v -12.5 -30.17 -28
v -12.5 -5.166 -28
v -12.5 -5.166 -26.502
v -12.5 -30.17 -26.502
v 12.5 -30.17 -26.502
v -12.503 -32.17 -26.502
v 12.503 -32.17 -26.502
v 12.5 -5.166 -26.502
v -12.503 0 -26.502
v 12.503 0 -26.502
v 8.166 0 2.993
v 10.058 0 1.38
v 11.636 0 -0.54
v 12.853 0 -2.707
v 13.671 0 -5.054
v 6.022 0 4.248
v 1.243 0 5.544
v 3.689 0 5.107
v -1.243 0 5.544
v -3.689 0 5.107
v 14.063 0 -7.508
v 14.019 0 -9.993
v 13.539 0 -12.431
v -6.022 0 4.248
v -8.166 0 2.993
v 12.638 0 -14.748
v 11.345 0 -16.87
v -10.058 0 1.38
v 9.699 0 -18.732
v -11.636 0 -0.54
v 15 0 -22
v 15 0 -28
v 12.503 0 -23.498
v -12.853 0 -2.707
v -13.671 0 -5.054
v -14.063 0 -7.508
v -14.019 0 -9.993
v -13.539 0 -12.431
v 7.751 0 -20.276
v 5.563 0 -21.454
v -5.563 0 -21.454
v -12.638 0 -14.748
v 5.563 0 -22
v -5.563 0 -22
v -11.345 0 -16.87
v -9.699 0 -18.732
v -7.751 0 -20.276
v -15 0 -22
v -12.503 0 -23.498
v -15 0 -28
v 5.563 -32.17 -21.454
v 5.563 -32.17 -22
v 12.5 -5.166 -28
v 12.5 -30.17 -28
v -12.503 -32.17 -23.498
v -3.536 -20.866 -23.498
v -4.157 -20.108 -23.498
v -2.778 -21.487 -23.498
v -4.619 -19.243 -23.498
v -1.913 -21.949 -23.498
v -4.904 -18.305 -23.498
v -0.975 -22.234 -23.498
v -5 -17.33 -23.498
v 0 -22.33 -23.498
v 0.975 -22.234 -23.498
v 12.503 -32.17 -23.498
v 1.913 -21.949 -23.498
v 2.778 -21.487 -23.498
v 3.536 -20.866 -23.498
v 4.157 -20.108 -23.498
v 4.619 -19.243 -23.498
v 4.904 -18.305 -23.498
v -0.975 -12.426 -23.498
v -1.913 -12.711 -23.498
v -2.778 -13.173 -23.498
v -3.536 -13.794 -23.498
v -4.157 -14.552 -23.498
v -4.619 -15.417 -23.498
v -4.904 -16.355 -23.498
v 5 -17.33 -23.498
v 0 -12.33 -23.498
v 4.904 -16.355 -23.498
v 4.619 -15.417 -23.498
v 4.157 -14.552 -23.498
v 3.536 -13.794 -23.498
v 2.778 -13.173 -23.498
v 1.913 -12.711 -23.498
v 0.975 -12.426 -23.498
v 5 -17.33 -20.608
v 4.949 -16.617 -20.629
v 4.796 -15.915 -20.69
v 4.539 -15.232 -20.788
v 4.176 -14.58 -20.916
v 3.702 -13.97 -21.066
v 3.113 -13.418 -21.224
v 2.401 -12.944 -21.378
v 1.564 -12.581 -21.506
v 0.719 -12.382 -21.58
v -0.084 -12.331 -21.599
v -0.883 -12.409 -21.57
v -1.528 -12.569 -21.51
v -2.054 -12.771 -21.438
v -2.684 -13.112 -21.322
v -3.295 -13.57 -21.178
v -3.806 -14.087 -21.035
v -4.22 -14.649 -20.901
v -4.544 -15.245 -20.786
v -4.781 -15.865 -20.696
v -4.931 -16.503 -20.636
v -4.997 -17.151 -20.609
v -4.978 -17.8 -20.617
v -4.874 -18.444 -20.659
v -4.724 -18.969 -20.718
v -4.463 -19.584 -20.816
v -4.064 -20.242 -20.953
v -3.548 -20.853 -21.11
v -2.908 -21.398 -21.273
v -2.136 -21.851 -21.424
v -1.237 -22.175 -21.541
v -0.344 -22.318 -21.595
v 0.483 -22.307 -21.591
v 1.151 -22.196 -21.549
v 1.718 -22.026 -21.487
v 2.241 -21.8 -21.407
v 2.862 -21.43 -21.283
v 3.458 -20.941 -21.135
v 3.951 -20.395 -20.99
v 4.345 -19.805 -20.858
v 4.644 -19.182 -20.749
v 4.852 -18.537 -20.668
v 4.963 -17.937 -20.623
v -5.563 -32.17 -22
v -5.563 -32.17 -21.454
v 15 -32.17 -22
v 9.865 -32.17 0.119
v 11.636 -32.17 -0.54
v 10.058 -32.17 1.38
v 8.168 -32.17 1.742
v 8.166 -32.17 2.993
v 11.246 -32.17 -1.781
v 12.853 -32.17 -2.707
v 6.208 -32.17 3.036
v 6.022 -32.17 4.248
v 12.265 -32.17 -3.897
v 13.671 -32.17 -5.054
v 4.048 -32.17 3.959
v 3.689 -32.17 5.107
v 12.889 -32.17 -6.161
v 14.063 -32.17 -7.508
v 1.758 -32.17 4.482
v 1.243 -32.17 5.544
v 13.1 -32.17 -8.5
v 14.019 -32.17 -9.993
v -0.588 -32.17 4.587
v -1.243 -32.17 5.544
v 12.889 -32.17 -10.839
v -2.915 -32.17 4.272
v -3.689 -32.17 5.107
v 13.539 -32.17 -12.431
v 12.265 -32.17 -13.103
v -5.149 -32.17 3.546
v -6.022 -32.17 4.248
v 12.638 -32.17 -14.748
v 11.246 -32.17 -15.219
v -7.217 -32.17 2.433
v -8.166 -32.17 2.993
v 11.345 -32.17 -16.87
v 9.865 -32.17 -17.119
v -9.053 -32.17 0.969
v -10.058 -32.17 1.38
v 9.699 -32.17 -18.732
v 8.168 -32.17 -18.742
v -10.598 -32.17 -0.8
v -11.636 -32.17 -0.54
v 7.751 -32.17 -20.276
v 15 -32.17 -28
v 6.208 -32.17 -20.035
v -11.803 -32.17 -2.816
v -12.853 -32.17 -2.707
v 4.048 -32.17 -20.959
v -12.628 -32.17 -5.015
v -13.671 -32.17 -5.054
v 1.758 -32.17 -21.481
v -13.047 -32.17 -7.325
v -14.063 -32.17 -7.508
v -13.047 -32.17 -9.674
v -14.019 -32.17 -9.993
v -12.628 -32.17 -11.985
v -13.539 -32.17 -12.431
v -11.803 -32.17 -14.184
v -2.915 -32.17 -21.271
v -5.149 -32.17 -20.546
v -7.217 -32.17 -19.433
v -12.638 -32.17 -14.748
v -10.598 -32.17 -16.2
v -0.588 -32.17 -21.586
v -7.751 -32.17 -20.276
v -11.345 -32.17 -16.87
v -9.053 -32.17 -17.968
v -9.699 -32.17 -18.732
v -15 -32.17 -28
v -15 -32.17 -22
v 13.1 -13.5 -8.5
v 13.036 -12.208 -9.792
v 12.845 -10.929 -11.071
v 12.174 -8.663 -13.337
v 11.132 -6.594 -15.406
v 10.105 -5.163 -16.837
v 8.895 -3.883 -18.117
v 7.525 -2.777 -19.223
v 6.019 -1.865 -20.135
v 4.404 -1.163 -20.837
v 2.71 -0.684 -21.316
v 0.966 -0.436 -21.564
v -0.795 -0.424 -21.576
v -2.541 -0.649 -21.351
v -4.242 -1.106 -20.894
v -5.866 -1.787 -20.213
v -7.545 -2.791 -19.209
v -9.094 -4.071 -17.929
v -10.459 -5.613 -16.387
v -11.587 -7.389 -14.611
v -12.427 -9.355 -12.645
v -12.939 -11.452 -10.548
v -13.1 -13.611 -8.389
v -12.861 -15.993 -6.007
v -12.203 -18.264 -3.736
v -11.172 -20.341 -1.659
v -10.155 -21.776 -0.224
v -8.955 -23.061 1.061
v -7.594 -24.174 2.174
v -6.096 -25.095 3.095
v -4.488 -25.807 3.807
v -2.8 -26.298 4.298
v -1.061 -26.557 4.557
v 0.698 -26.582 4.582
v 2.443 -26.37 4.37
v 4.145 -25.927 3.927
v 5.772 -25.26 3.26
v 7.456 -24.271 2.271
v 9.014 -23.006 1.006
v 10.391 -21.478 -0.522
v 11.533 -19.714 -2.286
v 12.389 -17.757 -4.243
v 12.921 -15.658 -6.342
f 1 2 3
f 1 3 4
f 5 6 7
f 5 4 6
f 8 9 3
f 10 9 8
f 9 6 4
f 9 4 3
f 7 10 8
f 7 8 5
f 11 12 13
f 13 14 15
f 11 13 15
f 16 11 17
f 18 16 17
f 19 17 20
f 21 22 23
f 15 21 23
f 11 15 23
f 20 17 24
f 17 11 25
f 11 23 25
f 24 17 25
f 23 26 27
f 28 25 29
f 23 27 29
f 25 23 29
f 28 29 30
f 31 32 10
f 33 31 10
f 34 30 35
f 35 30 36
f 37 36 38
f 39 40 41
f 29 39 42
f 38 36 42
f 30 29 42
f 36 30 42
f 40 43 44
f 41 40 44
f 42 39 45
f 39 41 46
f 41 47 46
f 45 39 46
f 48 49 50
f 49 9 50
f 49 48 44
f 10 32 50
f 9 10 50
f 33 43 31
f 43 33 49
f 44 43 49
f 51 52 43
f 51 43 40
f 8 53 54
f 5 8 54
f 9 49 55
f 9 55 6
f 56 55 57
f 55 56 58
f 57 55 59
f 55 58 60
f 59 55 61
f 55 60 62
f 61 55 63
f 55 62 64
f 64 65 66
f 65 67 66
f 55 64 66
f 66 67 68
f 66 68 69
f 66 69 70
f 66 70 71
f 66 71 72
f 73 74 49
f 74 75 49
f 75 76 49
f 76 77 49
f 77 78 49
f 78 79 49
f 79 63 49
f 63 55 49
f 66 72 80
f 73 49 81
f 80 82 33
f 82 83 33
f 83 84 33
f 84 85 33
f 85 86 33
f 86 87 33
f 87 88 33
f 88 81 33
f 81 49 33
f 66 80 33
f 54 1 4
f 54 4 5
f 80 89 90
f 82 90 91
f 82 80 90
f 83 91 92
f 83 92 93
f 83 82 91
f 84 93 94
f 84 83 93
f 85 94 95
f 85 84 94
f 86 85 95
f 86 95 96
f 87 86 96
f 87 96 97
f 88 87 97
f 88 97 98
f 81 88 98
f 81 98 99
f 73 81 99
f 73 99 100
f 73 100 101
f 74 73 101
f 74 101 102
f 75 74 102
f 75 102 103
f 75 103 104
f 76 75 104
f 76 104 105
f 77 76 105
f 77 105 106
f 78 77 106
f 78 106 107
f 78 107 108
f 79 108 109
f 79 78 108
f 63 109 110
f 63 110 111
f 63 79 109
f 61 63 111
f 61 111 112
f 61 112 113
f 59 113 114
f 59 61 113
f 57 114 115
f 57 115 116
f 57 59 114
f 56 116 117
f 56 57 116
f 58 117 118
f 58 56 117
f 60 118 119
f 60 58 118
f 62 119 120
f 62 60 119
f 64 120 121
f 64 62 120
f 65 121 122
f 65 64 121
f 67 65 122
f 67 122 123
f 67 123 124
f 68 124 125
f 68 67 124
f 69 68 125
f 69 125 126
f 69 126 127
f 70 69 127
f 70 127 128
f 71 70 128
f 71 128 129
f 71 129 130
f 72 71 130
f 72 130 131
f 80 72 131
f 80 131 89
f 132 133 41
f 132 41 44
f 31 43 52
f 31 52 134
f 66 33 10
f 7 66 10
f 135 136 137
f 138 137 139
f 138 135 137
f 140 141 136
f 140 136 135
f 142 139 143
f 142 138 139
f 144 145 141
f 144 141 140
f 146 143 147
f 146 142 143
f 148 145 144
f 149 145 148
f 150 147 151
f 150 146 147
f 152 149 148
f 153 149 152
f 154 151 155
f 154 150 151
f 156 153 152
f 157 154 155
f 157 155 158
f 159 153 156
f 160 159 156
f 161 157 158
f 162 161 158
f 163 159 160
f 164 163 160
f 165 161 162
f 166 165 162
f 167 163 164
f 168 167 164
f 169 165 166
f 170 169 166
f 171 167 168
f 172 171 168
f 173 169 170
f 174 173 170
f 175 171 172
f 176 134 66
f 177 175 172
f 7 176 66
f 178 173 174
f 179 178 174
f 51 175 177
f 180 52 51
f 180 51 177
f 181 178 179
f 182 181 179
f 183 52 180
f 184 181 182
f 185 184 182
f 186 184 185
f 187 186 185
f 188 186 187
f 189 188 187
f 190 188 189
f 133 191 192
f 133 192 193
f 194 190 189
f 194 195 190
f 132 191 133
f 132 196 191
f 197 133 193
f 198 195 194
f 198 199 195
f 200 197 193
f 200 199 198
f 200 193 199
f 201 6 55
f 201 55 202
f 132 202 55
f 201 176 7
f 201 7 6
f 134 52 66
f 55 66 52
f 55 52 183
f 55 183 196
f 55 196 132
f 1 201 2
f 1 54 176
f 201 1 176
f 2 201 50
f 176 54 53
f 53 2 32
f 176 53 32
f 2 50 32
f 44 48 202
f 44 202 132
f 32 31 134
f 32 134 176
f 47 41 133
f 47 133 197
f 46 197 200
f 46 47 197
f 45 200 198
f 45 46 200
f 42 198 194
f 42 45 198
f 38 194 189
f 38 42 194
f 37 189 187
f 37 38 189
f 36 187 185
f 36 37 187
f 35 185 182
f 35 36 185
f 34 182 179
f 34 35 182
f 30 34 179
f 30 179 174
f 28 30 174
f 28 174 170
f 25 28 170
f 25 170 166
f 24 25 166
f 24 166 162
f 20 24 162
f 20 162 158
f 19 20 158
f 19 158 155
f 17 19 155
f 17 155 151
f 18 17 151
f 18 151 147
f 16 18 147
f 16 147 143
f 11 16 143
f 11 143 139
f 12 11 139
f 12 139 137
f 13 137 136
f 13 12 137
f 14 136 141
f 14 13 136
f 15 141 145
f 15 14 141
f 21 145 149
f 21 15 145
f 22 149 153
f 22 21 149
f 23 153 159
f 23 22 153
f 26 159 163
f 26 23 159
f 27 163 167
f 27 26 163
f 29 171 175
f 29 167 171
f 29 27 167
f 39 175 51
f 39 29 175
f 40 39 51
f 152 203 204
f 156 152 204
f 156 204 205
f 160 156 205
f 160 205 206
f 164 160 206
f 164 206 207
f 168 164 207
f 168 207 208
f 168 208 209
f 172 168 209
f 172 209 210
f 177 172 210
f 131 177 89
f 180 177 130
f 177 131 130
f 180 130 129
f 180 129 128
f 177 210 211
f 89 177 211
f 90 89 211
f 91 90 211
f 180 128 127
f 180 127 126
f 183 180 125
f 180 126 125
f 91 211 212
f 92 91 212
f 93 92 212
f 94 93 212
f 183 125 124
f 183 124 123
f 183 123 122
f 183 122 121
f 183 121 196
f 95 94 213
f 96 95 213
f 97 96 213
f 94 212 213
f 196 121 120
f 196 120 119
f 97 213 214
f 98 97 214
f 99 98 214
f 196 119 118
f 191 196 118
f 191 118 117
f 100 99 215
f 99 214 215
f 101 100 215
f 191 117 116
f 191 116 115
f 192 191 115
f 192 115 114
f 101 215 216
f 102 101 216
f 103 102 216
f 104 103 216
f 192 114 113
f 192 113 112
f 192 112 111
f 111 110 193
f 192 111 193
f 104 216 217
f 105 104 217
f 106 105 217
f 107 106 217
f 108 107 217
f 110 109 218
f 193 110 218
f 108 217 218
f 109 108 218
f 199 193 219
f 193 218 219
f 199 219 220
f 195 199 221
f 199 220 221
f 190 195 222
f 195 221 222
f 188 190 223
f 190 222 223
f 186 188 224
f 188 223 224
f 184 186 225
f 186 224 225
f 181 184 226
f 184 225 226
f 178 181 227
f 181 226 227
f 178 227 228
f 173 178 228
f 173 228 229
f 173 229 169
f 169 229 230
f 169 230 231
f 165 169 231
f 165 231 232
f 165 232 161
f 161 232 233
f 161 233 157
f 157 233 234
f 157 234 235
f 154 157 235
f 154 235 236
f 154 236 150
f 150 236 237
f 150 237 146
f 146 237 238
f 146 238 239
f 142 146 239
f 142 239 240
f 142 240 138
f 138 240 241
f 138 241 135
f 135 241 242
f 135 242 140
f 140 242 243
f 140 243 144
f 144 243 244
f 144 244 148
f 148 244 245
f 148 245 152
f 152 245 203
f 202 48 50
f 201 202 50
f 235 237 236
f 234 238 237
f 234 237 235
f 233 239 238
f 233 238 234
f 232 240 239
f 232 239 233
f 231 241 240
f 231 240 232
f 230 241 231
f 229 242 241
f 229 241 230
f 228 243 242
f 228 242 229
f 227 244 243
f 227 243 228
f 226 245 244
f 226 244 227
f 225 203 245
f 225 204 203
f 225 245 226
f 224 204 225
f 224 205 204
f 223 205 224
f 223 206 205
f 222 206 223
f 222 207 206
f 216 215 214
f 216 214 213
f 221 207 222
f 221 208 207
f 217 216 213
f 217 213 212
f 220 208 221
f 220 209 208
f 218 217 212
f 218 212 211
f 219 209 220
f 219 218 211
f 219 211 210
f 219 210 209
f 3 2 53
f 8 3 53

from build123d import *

# Parameters (mm, degrees)
CROQUIS1_W                 = 30
CROQUIS1_H                 = 6
CROQUIS1_W_2               = 25.006000518
CROQUIS1_H_2               = 3.004001618
SALIENTE_EXTRUIR1_DEPTH    = 32.17
CROQUIS2_W                 = 25
CROQUIS2_H                 = 25.003841724
CORTAR_EXTRUIR1_DEPTH      = 1.497999
CROQUIS3_R                 = 14.098435913
CROQUIS3_R_2               = 13.1
SALIENTE_EXTRUIR2_DEPTH    = 32.17
CROQUIS10_W                = 30.177827817
CROQUIS10_H                = 41.273822818
SALIENTE_EXTRUIR4_DEPTH    = 22
CORTAR_EXTRUIR2_DEPTH      = 10
CORTAR_EXTRUIR2_DEPTH_BACK = 58
CROQUIS12_W                = 43.091208183
CROQUIS12_H                = 18.563452801
CORTAR_EXTRUIR3_DEPTH      = 58
CORTAR_EXTRUIR3_DEPTH_BACK = 58
SALIENTE_EXTRUIR6_DEPTH    = 32.17
CROQUIS22_R                = 5
CORTAR_EXTRUIR6_DEPTH      = 4


with BuildPart() as part:
    # Croquis1 → Saliente-Extruir1 (new body)
    with BuildSketch(Plane(origin=(0, 0, 0), x_dir=(1, 0, 0), z_dir=(0, 1, 0))):
        with Locations((0, 25)):
            Rectangle(CROQUIS1_W, CROQUIS1_H)
        with Locations((0, 25)):
            Rectangle(CROQUIS1_W_2, CROQUIS1_H_2, mode=Mode.SUBTRACT)
    extrude(amount=-SALIENTE_EXTRUIR1_DEPTH)

    # Croquis2 → Cortar-Extruir1 (cut)
    with BuildSketch(Plane(origin=(0, 0, -28), x_dir=(1, 0, 0), z_dir=(0, 0, -1))):
        with Locations((0, 17.668079138)):
            Rectangle(CROQUIS2_W, CROQUIS2_H)
    extrude(amount=-CORTAR_EXTRUIR1_DEPTH, mode=Mode.SUBTRACT)

    # Croquis3 → Saliente-Extruir2 (add)
    with BuildSketch(Plane(origin=(0, 0, 0), x_dir=(1, 0, 0), z_dir=(0, 1, 0))):
        with Locations((0, 8.499687815)):
            Circle(CROQUIS3_R)
        with Locations((0, 8.499687815)):
            Circle(CROQUIS3_R_2, mode=Mode.SUBTRACT)
    extrude(amount=-SALIENTE_EXTRUIR2_DEPTH)

    # Croquis10 → Saliente-Extruir4 (add)
    with BuildSketch(Plane(origin=(0, -11, -11), x_dir=(-1, 0, 0), z_dir=(0, -0.707106781, -0.707106781))):
        with Locations((-0.620676422, -5.363625683)):
            Rectangle(CROQUIS10_W, CROQUIS10_H)
    extrude(amount=-SALIENTE_EXTRUIR4_DEPTH)

    # Croquis11 → Cortar-Extruir2 (cut, two sides)
    with BuildSketch(Plane.XZ.offset(32.17)) as cortar_extruir2_sk:
        with BuildLine():
            Line((-4.676723545, -21.799843908), (-14.468237486, -21.799843908))
            Line((-14.468237486, -21.799843908), (-14.468237486, 22.941505279))
            Line((-14.468237486, 22.941505279), (15.709590331, 22.941505279))
            Line((15.709590331, 22.941505279), (15.709590331, -21.799843908))
            Line((15.709590331, -21.799843908), (4.676723545, -21.799843908))
            ThreePointArc((4.676723545, -21.799843908), (0, 5.598748098), (-4.676723545, -21.799843908))
        make_face()
    extrude(amount=CORTAR_EXTRUIR2_DEPTH, mode=Mode.SUBTRACT)
    extrude(cortar_extruir2_sk.sketch, amount=-CORTAR_EXTRUIR2_DEPTH_BACK, mode=Mode.SUBTRACT)

    # Croquis12 → Cortar-Extruir3 (cut, two sides)
    with BuildSketch(Plane(origin=(0, 0, 0), x_dir=(0, 0, -1), z_dir=(1, 0, 0))) as cortar_extruir3_sk:
        with Locations((6.454395908, 9.281726401)):
            Rectangle(CROQUIS12_W, CROQUIS12_H)
    extrude(amount=CORTAR_EXTRUIR3_DEPTH, mode=Mode.SUBTRACT)
    extrude(cortar_extruir3_sk.sketch, amount=-CORTAR_EXTRUIR3_DEPTH_BACK, mode=Mode.SUBTRACT)

    # Croquis23 → Saliente-Extruir6 (add, through all)
    with BuildSketch(Plane(origin=(0, 0, 0), x_dir=(1, 0, 0), z_dir=(0, 1, 0))):
        with BuildLine():
            Line((-5.562938112, 22), (-4.062938112, 22))
            ThreePointArc((-4.062938112, 22), (-4.820668551, 21.748350009), (-5.562938112, 21.454208831))
            Line((-5.562938112, 21.454208831), (-5.562938112, 22))
        make_face()
        with BuildLine():
            Line((4.062938112, 22), (5.562938112, 22))
            Line((5.562938112, 22), (5.562938112, 21.454208831))
            ThreePointArc((5.562938112, 21.454208831), (4.820668551, 21.748350009), (4.062938112, 22))
        make_face()
    extrude(amount=-SALIENTE_EXTRUIR6_DEPTH)

    # Croquis22 → Cortar-Extruir6 (cut)
    with BuildSketch(Plane.XY.offset(-23.497999191)):
        with Locations((0, -17.33)):
            Circle(CROQUIS22_R)
    extrude(amount=CORTAR_EXTRUIR6_DEPTH, mode=Mode.SUBTRACT)


solid = part.part
